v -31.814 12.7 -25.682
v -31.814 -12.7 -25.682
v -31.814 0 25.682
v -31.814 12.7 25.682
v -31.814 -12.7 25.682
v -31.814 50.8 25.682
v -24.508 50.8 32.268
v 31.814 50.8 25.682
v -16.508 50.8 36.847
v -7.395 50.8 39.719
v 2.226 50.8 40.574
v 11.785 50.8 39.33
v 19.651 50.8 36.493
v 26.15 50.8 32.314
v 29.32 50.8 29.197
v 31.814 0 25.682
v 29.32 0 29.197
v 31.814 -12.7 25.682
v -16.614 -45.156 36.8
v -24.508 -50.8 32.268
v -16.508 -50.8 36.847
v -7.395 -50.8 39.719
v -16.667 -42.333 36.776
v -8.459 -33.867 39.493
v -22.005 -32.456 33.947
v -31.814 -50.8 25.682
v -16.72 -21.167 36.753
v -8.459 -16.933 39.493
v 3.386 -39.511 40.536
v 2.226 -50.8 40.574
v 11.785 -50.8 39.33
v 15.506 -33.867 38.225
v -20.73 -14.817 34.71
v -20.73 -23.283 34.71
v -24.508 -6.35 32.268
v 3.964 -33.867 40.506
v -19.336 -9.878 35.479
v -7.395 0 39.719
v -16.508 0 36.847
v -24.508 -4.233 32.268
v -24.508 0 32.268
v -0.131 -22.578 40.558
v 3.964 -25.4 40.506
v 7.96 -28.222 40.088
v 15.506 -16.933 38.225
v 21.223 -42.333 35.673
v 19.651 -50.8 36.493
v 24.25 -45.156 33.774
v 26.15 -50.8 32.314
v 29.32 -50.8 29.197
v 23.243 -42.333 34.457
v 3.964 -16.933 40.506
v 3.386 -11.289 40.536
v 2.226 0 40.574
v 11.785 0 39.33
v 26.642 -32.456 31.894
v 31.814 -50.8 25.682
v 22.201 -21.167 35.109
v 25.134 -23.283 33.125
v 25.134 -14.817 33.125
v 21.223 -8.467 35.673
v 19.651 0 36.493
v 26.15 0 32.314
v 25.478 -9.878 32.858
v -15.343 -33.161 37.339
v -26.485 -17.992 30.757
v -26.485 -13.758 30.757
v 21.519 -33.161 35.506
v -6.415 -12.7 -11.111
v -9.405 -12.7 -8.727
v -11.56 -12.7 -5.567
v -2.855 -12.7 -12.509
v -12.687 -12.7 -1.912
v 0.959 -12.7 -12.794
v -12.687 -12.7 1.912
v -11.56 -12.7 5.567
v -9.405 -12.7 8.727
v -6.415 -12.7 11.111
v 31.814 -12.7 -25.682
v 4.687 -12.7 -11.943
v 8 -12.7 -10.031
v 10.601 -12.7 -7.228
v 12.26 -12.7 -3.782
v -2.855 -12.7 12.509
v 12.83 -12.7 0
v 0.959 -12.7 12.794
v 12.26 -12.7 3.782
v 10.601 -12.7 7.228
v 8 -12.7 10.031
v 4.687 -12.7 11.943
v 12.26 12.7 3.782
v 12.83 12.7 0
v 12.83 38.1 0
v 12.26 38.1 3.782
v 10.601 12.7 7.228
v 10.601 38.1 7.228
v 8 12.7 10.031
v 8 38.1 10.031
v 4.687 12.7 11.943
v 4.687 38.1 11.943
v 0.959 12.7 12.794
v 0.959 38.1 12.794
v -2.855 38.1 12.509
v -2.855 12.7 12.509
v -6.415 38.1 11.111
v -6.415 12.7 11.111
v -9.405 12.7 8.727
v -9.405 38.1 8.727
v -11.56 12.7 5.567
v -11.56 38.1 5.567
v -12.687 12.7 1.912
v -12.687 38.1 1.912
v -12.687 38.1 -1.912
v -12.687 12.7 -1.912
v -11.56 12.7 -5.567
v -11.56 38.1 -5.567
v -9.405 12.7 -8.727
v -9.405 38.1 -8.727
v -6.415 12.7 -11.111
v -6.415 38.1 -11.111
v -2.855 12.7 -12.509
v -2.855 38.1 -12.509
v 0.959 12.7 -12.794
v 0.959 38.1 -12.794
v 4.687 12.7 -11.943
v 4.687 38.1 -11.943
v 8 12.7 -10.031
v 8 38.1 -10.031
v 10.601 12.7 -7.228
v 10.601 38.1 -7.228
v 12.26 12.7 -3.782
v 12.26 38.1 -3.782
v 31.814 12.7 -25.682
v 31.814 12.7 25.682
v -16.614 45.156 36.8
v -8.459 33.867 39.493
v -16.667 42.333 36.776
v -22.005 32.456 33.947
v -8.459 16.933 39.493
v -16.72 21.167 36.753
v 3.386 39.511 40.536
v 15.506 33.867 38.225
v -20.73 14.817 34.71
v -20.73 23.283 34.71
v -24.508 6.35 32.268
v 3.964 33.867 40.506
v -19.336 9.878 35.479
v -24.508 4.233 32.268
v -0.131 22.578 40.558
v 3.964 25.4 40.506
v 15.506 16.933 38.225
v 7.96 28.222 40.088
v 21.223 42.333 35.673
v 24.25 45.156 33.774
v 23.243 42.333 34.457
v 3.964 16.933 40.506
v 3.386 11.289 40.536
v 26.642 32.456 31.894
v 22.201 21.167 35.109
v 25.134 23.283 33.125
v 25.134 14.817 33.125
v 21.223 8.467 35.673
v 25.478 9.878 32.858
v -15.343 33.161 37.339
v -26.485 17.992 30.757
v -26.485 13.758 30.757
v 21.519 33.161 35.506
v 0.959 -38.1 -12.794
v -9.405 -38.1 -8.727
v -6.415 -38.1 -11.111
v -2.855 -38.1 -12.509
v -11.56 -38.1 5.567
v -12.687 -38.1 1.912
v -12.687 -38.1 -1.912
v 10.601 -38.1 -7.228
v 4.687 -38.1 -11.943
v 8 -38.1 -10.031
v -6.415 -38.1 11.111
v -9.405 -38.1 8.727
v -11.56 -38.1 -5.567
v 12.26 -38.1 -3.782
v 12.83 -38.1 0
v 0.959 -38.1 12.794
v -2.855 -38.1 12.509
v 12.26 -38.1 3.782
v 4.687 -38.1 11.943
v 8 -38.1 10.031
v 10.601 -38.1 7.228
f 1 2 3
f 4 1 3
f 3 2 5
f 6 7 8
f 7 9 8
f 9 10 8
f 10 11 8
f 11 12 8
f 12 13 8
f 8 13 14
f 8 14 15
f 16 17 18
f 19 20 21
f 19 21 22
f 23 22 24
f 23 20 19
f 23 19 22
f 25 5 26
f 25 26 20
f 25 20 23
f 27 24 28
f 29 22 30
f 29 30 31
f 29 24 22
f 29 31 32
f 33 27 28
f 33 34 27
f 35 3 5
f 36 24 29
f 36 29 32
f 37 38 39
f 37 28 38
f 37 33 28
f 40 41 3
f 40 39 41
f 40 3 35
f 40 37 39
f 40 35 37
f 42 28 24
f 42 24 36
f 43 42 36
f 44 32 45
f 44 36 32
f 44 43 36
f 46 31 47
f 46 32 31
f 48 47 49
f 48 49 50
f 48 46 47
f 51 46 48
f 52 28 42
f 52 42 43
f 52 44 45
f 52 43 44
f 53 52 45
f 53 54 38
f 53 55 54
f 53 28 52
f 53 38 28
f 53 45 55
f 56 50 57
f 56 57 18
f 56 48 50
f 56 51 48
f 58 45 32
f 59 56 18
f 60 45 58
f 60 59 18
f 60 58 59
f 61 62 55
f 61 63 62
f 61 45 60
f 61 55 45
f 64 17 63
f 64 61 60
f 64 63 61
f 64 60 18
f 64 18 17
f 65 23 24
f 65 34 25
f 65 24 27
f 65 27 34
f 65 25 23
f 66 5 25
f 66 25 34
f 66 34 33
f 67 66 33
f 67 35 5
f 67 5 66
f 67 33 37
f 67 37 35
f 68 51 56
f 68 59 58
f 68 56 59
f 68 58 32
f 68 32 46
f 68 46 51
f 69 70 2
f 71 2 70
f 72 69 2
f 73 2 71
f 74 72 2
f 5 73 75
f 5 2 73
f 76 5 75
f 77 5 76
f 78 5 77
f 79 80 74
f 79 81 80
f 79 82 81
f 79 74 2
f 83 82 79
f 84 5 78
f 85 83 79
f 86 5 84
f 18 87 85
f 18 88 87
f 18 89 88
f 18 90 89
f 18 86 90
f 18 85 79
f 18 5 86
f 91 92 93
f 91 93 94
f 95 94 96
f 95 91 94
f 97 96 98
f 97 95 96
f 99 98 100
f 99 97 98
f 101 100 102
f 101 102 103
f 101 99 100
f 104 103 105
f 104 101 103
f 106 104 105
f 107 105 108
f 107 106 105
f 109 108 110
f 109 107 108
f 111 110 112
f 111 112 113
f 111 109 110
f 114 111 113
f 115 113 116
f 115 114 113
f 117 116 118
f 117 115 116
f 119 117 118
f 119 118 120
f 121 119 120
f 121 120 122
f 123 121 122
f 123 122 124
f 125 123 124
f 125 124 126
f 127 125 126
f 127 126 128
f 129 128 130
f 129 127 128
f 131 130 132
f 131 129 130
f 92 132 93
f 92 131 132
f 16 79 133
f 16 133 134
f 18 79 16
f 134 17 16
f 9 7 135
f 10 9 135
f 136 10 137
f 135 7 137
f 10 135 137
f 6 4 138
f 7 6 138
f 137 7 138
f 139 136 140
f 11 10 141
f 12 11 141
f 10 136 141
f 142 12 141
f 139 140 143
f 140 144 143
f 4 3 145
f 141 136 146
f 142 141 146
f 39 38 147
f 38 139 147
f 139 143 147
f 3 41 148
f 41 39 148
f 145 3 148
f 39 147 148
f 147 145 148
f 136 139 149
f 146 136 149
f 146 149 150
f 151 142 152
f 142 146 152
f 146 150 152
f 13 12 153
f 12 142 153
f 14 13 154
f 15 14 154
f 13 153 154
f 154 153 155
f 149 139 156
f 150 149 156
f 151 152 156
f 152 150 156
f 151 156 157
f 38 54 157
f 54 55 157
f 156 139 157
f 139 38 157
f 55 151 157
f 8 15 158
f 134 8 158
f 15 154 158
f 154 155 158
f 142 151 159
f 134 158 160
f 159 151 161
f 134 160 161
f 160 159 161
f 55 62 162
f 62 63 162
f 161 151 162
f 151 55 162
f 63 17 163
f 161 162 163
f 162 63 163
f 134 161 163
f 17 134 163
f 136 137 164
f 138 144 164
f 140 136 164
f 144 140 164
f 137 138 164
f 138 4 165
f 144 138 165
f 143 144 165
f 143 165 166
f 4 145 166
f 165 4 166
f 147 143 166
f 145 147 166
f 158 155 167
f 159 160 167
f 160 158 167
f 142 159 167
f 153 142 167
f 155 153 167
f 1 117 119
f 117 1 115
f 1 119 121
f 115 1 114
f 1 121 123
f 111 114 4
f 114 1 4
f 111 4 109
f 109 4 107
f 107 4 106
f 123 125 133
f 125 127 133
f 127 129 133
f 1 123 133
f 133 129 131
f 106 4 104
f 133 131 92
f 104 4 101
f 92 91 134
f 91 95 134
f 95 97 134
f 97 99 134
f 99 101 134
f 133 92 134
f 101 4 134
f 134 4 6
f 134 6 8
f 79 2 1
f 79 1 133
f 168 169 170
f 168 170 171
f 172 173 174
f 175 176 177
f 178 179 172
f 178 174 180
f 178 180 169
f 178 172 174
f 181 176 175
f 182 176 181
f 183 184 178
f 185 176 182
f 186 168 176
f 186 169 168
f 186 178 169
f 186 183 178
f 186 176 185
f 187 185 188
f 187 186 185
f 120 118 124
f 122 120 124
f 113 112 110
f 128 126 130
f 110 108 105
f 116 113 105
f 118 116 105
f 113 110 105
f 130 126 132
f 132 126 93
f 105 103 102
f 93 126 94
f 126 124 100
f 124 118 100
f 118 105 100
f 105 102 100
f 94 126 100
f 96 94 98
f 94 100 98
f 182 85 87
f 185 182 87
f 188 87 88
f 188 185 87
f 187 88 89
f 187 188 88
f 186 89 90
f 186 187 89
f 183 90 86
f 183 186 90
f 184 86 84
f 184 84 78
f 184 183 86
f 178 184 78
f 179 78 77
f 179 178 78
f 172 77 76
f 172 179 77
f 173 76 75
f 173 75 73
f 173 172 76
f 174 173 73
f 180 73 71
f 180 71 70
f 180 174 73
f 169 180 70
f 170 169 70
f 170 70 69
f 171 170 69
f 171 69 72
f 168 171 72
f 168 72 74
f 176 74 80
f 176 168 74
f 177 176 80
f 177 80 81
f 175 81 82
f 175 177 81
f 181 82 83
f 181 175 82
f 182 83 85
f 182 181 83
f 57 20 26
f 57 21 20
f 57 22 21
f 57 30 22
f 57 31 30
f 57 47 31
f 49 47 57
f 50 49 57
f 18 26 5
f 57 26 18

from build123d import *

# Parameters (mm, degrees)
F0_W     = 63.627512
F0_H     = 51.364652
F0_R     = 12.830252
F1_DEPTH = 12.7
F2_DEPTH = 50.8
F3_DEPTH = 38.1


with BuildPart() as f1:
    # F0 (on Front) → F1 (new body, symmetric)
    with BuildSketch(Plane.XZ):
        Rectangle(F0_W, F0_H)
        Circle(F0_R, mode=Mode.SUBTRACT)
    extrude(amount=F1_DEPTH, both=True)

    # F0 (on Front) → F2 (join, symmetric)
    with BuildSketch(Plane.XZ):
        with BuildLine():
            Line((-31.813756, 25.682326), (31.813756, 25.682326))
            add(Edge.make_bspline(
                [(-31.813756, 25.682326), (-11.520594, 48.300739), (22.089949, 42.593289), (31.813756, 25.682326)],
                knots=[0, 0, 0, 0, 63.627511, 63.627511, 63.627511, 63.627511], degree=3))
        make_face()
    extrude(amount=F2_DEPTH, both=True)

    # F0 (on Front) → F3 (join, symmetric)
    with BuildSketch(Plane.XZ):
        Circle(F0_R)
    extrude(amount=F3_DEPTH, both=True)


solid = f1.part
